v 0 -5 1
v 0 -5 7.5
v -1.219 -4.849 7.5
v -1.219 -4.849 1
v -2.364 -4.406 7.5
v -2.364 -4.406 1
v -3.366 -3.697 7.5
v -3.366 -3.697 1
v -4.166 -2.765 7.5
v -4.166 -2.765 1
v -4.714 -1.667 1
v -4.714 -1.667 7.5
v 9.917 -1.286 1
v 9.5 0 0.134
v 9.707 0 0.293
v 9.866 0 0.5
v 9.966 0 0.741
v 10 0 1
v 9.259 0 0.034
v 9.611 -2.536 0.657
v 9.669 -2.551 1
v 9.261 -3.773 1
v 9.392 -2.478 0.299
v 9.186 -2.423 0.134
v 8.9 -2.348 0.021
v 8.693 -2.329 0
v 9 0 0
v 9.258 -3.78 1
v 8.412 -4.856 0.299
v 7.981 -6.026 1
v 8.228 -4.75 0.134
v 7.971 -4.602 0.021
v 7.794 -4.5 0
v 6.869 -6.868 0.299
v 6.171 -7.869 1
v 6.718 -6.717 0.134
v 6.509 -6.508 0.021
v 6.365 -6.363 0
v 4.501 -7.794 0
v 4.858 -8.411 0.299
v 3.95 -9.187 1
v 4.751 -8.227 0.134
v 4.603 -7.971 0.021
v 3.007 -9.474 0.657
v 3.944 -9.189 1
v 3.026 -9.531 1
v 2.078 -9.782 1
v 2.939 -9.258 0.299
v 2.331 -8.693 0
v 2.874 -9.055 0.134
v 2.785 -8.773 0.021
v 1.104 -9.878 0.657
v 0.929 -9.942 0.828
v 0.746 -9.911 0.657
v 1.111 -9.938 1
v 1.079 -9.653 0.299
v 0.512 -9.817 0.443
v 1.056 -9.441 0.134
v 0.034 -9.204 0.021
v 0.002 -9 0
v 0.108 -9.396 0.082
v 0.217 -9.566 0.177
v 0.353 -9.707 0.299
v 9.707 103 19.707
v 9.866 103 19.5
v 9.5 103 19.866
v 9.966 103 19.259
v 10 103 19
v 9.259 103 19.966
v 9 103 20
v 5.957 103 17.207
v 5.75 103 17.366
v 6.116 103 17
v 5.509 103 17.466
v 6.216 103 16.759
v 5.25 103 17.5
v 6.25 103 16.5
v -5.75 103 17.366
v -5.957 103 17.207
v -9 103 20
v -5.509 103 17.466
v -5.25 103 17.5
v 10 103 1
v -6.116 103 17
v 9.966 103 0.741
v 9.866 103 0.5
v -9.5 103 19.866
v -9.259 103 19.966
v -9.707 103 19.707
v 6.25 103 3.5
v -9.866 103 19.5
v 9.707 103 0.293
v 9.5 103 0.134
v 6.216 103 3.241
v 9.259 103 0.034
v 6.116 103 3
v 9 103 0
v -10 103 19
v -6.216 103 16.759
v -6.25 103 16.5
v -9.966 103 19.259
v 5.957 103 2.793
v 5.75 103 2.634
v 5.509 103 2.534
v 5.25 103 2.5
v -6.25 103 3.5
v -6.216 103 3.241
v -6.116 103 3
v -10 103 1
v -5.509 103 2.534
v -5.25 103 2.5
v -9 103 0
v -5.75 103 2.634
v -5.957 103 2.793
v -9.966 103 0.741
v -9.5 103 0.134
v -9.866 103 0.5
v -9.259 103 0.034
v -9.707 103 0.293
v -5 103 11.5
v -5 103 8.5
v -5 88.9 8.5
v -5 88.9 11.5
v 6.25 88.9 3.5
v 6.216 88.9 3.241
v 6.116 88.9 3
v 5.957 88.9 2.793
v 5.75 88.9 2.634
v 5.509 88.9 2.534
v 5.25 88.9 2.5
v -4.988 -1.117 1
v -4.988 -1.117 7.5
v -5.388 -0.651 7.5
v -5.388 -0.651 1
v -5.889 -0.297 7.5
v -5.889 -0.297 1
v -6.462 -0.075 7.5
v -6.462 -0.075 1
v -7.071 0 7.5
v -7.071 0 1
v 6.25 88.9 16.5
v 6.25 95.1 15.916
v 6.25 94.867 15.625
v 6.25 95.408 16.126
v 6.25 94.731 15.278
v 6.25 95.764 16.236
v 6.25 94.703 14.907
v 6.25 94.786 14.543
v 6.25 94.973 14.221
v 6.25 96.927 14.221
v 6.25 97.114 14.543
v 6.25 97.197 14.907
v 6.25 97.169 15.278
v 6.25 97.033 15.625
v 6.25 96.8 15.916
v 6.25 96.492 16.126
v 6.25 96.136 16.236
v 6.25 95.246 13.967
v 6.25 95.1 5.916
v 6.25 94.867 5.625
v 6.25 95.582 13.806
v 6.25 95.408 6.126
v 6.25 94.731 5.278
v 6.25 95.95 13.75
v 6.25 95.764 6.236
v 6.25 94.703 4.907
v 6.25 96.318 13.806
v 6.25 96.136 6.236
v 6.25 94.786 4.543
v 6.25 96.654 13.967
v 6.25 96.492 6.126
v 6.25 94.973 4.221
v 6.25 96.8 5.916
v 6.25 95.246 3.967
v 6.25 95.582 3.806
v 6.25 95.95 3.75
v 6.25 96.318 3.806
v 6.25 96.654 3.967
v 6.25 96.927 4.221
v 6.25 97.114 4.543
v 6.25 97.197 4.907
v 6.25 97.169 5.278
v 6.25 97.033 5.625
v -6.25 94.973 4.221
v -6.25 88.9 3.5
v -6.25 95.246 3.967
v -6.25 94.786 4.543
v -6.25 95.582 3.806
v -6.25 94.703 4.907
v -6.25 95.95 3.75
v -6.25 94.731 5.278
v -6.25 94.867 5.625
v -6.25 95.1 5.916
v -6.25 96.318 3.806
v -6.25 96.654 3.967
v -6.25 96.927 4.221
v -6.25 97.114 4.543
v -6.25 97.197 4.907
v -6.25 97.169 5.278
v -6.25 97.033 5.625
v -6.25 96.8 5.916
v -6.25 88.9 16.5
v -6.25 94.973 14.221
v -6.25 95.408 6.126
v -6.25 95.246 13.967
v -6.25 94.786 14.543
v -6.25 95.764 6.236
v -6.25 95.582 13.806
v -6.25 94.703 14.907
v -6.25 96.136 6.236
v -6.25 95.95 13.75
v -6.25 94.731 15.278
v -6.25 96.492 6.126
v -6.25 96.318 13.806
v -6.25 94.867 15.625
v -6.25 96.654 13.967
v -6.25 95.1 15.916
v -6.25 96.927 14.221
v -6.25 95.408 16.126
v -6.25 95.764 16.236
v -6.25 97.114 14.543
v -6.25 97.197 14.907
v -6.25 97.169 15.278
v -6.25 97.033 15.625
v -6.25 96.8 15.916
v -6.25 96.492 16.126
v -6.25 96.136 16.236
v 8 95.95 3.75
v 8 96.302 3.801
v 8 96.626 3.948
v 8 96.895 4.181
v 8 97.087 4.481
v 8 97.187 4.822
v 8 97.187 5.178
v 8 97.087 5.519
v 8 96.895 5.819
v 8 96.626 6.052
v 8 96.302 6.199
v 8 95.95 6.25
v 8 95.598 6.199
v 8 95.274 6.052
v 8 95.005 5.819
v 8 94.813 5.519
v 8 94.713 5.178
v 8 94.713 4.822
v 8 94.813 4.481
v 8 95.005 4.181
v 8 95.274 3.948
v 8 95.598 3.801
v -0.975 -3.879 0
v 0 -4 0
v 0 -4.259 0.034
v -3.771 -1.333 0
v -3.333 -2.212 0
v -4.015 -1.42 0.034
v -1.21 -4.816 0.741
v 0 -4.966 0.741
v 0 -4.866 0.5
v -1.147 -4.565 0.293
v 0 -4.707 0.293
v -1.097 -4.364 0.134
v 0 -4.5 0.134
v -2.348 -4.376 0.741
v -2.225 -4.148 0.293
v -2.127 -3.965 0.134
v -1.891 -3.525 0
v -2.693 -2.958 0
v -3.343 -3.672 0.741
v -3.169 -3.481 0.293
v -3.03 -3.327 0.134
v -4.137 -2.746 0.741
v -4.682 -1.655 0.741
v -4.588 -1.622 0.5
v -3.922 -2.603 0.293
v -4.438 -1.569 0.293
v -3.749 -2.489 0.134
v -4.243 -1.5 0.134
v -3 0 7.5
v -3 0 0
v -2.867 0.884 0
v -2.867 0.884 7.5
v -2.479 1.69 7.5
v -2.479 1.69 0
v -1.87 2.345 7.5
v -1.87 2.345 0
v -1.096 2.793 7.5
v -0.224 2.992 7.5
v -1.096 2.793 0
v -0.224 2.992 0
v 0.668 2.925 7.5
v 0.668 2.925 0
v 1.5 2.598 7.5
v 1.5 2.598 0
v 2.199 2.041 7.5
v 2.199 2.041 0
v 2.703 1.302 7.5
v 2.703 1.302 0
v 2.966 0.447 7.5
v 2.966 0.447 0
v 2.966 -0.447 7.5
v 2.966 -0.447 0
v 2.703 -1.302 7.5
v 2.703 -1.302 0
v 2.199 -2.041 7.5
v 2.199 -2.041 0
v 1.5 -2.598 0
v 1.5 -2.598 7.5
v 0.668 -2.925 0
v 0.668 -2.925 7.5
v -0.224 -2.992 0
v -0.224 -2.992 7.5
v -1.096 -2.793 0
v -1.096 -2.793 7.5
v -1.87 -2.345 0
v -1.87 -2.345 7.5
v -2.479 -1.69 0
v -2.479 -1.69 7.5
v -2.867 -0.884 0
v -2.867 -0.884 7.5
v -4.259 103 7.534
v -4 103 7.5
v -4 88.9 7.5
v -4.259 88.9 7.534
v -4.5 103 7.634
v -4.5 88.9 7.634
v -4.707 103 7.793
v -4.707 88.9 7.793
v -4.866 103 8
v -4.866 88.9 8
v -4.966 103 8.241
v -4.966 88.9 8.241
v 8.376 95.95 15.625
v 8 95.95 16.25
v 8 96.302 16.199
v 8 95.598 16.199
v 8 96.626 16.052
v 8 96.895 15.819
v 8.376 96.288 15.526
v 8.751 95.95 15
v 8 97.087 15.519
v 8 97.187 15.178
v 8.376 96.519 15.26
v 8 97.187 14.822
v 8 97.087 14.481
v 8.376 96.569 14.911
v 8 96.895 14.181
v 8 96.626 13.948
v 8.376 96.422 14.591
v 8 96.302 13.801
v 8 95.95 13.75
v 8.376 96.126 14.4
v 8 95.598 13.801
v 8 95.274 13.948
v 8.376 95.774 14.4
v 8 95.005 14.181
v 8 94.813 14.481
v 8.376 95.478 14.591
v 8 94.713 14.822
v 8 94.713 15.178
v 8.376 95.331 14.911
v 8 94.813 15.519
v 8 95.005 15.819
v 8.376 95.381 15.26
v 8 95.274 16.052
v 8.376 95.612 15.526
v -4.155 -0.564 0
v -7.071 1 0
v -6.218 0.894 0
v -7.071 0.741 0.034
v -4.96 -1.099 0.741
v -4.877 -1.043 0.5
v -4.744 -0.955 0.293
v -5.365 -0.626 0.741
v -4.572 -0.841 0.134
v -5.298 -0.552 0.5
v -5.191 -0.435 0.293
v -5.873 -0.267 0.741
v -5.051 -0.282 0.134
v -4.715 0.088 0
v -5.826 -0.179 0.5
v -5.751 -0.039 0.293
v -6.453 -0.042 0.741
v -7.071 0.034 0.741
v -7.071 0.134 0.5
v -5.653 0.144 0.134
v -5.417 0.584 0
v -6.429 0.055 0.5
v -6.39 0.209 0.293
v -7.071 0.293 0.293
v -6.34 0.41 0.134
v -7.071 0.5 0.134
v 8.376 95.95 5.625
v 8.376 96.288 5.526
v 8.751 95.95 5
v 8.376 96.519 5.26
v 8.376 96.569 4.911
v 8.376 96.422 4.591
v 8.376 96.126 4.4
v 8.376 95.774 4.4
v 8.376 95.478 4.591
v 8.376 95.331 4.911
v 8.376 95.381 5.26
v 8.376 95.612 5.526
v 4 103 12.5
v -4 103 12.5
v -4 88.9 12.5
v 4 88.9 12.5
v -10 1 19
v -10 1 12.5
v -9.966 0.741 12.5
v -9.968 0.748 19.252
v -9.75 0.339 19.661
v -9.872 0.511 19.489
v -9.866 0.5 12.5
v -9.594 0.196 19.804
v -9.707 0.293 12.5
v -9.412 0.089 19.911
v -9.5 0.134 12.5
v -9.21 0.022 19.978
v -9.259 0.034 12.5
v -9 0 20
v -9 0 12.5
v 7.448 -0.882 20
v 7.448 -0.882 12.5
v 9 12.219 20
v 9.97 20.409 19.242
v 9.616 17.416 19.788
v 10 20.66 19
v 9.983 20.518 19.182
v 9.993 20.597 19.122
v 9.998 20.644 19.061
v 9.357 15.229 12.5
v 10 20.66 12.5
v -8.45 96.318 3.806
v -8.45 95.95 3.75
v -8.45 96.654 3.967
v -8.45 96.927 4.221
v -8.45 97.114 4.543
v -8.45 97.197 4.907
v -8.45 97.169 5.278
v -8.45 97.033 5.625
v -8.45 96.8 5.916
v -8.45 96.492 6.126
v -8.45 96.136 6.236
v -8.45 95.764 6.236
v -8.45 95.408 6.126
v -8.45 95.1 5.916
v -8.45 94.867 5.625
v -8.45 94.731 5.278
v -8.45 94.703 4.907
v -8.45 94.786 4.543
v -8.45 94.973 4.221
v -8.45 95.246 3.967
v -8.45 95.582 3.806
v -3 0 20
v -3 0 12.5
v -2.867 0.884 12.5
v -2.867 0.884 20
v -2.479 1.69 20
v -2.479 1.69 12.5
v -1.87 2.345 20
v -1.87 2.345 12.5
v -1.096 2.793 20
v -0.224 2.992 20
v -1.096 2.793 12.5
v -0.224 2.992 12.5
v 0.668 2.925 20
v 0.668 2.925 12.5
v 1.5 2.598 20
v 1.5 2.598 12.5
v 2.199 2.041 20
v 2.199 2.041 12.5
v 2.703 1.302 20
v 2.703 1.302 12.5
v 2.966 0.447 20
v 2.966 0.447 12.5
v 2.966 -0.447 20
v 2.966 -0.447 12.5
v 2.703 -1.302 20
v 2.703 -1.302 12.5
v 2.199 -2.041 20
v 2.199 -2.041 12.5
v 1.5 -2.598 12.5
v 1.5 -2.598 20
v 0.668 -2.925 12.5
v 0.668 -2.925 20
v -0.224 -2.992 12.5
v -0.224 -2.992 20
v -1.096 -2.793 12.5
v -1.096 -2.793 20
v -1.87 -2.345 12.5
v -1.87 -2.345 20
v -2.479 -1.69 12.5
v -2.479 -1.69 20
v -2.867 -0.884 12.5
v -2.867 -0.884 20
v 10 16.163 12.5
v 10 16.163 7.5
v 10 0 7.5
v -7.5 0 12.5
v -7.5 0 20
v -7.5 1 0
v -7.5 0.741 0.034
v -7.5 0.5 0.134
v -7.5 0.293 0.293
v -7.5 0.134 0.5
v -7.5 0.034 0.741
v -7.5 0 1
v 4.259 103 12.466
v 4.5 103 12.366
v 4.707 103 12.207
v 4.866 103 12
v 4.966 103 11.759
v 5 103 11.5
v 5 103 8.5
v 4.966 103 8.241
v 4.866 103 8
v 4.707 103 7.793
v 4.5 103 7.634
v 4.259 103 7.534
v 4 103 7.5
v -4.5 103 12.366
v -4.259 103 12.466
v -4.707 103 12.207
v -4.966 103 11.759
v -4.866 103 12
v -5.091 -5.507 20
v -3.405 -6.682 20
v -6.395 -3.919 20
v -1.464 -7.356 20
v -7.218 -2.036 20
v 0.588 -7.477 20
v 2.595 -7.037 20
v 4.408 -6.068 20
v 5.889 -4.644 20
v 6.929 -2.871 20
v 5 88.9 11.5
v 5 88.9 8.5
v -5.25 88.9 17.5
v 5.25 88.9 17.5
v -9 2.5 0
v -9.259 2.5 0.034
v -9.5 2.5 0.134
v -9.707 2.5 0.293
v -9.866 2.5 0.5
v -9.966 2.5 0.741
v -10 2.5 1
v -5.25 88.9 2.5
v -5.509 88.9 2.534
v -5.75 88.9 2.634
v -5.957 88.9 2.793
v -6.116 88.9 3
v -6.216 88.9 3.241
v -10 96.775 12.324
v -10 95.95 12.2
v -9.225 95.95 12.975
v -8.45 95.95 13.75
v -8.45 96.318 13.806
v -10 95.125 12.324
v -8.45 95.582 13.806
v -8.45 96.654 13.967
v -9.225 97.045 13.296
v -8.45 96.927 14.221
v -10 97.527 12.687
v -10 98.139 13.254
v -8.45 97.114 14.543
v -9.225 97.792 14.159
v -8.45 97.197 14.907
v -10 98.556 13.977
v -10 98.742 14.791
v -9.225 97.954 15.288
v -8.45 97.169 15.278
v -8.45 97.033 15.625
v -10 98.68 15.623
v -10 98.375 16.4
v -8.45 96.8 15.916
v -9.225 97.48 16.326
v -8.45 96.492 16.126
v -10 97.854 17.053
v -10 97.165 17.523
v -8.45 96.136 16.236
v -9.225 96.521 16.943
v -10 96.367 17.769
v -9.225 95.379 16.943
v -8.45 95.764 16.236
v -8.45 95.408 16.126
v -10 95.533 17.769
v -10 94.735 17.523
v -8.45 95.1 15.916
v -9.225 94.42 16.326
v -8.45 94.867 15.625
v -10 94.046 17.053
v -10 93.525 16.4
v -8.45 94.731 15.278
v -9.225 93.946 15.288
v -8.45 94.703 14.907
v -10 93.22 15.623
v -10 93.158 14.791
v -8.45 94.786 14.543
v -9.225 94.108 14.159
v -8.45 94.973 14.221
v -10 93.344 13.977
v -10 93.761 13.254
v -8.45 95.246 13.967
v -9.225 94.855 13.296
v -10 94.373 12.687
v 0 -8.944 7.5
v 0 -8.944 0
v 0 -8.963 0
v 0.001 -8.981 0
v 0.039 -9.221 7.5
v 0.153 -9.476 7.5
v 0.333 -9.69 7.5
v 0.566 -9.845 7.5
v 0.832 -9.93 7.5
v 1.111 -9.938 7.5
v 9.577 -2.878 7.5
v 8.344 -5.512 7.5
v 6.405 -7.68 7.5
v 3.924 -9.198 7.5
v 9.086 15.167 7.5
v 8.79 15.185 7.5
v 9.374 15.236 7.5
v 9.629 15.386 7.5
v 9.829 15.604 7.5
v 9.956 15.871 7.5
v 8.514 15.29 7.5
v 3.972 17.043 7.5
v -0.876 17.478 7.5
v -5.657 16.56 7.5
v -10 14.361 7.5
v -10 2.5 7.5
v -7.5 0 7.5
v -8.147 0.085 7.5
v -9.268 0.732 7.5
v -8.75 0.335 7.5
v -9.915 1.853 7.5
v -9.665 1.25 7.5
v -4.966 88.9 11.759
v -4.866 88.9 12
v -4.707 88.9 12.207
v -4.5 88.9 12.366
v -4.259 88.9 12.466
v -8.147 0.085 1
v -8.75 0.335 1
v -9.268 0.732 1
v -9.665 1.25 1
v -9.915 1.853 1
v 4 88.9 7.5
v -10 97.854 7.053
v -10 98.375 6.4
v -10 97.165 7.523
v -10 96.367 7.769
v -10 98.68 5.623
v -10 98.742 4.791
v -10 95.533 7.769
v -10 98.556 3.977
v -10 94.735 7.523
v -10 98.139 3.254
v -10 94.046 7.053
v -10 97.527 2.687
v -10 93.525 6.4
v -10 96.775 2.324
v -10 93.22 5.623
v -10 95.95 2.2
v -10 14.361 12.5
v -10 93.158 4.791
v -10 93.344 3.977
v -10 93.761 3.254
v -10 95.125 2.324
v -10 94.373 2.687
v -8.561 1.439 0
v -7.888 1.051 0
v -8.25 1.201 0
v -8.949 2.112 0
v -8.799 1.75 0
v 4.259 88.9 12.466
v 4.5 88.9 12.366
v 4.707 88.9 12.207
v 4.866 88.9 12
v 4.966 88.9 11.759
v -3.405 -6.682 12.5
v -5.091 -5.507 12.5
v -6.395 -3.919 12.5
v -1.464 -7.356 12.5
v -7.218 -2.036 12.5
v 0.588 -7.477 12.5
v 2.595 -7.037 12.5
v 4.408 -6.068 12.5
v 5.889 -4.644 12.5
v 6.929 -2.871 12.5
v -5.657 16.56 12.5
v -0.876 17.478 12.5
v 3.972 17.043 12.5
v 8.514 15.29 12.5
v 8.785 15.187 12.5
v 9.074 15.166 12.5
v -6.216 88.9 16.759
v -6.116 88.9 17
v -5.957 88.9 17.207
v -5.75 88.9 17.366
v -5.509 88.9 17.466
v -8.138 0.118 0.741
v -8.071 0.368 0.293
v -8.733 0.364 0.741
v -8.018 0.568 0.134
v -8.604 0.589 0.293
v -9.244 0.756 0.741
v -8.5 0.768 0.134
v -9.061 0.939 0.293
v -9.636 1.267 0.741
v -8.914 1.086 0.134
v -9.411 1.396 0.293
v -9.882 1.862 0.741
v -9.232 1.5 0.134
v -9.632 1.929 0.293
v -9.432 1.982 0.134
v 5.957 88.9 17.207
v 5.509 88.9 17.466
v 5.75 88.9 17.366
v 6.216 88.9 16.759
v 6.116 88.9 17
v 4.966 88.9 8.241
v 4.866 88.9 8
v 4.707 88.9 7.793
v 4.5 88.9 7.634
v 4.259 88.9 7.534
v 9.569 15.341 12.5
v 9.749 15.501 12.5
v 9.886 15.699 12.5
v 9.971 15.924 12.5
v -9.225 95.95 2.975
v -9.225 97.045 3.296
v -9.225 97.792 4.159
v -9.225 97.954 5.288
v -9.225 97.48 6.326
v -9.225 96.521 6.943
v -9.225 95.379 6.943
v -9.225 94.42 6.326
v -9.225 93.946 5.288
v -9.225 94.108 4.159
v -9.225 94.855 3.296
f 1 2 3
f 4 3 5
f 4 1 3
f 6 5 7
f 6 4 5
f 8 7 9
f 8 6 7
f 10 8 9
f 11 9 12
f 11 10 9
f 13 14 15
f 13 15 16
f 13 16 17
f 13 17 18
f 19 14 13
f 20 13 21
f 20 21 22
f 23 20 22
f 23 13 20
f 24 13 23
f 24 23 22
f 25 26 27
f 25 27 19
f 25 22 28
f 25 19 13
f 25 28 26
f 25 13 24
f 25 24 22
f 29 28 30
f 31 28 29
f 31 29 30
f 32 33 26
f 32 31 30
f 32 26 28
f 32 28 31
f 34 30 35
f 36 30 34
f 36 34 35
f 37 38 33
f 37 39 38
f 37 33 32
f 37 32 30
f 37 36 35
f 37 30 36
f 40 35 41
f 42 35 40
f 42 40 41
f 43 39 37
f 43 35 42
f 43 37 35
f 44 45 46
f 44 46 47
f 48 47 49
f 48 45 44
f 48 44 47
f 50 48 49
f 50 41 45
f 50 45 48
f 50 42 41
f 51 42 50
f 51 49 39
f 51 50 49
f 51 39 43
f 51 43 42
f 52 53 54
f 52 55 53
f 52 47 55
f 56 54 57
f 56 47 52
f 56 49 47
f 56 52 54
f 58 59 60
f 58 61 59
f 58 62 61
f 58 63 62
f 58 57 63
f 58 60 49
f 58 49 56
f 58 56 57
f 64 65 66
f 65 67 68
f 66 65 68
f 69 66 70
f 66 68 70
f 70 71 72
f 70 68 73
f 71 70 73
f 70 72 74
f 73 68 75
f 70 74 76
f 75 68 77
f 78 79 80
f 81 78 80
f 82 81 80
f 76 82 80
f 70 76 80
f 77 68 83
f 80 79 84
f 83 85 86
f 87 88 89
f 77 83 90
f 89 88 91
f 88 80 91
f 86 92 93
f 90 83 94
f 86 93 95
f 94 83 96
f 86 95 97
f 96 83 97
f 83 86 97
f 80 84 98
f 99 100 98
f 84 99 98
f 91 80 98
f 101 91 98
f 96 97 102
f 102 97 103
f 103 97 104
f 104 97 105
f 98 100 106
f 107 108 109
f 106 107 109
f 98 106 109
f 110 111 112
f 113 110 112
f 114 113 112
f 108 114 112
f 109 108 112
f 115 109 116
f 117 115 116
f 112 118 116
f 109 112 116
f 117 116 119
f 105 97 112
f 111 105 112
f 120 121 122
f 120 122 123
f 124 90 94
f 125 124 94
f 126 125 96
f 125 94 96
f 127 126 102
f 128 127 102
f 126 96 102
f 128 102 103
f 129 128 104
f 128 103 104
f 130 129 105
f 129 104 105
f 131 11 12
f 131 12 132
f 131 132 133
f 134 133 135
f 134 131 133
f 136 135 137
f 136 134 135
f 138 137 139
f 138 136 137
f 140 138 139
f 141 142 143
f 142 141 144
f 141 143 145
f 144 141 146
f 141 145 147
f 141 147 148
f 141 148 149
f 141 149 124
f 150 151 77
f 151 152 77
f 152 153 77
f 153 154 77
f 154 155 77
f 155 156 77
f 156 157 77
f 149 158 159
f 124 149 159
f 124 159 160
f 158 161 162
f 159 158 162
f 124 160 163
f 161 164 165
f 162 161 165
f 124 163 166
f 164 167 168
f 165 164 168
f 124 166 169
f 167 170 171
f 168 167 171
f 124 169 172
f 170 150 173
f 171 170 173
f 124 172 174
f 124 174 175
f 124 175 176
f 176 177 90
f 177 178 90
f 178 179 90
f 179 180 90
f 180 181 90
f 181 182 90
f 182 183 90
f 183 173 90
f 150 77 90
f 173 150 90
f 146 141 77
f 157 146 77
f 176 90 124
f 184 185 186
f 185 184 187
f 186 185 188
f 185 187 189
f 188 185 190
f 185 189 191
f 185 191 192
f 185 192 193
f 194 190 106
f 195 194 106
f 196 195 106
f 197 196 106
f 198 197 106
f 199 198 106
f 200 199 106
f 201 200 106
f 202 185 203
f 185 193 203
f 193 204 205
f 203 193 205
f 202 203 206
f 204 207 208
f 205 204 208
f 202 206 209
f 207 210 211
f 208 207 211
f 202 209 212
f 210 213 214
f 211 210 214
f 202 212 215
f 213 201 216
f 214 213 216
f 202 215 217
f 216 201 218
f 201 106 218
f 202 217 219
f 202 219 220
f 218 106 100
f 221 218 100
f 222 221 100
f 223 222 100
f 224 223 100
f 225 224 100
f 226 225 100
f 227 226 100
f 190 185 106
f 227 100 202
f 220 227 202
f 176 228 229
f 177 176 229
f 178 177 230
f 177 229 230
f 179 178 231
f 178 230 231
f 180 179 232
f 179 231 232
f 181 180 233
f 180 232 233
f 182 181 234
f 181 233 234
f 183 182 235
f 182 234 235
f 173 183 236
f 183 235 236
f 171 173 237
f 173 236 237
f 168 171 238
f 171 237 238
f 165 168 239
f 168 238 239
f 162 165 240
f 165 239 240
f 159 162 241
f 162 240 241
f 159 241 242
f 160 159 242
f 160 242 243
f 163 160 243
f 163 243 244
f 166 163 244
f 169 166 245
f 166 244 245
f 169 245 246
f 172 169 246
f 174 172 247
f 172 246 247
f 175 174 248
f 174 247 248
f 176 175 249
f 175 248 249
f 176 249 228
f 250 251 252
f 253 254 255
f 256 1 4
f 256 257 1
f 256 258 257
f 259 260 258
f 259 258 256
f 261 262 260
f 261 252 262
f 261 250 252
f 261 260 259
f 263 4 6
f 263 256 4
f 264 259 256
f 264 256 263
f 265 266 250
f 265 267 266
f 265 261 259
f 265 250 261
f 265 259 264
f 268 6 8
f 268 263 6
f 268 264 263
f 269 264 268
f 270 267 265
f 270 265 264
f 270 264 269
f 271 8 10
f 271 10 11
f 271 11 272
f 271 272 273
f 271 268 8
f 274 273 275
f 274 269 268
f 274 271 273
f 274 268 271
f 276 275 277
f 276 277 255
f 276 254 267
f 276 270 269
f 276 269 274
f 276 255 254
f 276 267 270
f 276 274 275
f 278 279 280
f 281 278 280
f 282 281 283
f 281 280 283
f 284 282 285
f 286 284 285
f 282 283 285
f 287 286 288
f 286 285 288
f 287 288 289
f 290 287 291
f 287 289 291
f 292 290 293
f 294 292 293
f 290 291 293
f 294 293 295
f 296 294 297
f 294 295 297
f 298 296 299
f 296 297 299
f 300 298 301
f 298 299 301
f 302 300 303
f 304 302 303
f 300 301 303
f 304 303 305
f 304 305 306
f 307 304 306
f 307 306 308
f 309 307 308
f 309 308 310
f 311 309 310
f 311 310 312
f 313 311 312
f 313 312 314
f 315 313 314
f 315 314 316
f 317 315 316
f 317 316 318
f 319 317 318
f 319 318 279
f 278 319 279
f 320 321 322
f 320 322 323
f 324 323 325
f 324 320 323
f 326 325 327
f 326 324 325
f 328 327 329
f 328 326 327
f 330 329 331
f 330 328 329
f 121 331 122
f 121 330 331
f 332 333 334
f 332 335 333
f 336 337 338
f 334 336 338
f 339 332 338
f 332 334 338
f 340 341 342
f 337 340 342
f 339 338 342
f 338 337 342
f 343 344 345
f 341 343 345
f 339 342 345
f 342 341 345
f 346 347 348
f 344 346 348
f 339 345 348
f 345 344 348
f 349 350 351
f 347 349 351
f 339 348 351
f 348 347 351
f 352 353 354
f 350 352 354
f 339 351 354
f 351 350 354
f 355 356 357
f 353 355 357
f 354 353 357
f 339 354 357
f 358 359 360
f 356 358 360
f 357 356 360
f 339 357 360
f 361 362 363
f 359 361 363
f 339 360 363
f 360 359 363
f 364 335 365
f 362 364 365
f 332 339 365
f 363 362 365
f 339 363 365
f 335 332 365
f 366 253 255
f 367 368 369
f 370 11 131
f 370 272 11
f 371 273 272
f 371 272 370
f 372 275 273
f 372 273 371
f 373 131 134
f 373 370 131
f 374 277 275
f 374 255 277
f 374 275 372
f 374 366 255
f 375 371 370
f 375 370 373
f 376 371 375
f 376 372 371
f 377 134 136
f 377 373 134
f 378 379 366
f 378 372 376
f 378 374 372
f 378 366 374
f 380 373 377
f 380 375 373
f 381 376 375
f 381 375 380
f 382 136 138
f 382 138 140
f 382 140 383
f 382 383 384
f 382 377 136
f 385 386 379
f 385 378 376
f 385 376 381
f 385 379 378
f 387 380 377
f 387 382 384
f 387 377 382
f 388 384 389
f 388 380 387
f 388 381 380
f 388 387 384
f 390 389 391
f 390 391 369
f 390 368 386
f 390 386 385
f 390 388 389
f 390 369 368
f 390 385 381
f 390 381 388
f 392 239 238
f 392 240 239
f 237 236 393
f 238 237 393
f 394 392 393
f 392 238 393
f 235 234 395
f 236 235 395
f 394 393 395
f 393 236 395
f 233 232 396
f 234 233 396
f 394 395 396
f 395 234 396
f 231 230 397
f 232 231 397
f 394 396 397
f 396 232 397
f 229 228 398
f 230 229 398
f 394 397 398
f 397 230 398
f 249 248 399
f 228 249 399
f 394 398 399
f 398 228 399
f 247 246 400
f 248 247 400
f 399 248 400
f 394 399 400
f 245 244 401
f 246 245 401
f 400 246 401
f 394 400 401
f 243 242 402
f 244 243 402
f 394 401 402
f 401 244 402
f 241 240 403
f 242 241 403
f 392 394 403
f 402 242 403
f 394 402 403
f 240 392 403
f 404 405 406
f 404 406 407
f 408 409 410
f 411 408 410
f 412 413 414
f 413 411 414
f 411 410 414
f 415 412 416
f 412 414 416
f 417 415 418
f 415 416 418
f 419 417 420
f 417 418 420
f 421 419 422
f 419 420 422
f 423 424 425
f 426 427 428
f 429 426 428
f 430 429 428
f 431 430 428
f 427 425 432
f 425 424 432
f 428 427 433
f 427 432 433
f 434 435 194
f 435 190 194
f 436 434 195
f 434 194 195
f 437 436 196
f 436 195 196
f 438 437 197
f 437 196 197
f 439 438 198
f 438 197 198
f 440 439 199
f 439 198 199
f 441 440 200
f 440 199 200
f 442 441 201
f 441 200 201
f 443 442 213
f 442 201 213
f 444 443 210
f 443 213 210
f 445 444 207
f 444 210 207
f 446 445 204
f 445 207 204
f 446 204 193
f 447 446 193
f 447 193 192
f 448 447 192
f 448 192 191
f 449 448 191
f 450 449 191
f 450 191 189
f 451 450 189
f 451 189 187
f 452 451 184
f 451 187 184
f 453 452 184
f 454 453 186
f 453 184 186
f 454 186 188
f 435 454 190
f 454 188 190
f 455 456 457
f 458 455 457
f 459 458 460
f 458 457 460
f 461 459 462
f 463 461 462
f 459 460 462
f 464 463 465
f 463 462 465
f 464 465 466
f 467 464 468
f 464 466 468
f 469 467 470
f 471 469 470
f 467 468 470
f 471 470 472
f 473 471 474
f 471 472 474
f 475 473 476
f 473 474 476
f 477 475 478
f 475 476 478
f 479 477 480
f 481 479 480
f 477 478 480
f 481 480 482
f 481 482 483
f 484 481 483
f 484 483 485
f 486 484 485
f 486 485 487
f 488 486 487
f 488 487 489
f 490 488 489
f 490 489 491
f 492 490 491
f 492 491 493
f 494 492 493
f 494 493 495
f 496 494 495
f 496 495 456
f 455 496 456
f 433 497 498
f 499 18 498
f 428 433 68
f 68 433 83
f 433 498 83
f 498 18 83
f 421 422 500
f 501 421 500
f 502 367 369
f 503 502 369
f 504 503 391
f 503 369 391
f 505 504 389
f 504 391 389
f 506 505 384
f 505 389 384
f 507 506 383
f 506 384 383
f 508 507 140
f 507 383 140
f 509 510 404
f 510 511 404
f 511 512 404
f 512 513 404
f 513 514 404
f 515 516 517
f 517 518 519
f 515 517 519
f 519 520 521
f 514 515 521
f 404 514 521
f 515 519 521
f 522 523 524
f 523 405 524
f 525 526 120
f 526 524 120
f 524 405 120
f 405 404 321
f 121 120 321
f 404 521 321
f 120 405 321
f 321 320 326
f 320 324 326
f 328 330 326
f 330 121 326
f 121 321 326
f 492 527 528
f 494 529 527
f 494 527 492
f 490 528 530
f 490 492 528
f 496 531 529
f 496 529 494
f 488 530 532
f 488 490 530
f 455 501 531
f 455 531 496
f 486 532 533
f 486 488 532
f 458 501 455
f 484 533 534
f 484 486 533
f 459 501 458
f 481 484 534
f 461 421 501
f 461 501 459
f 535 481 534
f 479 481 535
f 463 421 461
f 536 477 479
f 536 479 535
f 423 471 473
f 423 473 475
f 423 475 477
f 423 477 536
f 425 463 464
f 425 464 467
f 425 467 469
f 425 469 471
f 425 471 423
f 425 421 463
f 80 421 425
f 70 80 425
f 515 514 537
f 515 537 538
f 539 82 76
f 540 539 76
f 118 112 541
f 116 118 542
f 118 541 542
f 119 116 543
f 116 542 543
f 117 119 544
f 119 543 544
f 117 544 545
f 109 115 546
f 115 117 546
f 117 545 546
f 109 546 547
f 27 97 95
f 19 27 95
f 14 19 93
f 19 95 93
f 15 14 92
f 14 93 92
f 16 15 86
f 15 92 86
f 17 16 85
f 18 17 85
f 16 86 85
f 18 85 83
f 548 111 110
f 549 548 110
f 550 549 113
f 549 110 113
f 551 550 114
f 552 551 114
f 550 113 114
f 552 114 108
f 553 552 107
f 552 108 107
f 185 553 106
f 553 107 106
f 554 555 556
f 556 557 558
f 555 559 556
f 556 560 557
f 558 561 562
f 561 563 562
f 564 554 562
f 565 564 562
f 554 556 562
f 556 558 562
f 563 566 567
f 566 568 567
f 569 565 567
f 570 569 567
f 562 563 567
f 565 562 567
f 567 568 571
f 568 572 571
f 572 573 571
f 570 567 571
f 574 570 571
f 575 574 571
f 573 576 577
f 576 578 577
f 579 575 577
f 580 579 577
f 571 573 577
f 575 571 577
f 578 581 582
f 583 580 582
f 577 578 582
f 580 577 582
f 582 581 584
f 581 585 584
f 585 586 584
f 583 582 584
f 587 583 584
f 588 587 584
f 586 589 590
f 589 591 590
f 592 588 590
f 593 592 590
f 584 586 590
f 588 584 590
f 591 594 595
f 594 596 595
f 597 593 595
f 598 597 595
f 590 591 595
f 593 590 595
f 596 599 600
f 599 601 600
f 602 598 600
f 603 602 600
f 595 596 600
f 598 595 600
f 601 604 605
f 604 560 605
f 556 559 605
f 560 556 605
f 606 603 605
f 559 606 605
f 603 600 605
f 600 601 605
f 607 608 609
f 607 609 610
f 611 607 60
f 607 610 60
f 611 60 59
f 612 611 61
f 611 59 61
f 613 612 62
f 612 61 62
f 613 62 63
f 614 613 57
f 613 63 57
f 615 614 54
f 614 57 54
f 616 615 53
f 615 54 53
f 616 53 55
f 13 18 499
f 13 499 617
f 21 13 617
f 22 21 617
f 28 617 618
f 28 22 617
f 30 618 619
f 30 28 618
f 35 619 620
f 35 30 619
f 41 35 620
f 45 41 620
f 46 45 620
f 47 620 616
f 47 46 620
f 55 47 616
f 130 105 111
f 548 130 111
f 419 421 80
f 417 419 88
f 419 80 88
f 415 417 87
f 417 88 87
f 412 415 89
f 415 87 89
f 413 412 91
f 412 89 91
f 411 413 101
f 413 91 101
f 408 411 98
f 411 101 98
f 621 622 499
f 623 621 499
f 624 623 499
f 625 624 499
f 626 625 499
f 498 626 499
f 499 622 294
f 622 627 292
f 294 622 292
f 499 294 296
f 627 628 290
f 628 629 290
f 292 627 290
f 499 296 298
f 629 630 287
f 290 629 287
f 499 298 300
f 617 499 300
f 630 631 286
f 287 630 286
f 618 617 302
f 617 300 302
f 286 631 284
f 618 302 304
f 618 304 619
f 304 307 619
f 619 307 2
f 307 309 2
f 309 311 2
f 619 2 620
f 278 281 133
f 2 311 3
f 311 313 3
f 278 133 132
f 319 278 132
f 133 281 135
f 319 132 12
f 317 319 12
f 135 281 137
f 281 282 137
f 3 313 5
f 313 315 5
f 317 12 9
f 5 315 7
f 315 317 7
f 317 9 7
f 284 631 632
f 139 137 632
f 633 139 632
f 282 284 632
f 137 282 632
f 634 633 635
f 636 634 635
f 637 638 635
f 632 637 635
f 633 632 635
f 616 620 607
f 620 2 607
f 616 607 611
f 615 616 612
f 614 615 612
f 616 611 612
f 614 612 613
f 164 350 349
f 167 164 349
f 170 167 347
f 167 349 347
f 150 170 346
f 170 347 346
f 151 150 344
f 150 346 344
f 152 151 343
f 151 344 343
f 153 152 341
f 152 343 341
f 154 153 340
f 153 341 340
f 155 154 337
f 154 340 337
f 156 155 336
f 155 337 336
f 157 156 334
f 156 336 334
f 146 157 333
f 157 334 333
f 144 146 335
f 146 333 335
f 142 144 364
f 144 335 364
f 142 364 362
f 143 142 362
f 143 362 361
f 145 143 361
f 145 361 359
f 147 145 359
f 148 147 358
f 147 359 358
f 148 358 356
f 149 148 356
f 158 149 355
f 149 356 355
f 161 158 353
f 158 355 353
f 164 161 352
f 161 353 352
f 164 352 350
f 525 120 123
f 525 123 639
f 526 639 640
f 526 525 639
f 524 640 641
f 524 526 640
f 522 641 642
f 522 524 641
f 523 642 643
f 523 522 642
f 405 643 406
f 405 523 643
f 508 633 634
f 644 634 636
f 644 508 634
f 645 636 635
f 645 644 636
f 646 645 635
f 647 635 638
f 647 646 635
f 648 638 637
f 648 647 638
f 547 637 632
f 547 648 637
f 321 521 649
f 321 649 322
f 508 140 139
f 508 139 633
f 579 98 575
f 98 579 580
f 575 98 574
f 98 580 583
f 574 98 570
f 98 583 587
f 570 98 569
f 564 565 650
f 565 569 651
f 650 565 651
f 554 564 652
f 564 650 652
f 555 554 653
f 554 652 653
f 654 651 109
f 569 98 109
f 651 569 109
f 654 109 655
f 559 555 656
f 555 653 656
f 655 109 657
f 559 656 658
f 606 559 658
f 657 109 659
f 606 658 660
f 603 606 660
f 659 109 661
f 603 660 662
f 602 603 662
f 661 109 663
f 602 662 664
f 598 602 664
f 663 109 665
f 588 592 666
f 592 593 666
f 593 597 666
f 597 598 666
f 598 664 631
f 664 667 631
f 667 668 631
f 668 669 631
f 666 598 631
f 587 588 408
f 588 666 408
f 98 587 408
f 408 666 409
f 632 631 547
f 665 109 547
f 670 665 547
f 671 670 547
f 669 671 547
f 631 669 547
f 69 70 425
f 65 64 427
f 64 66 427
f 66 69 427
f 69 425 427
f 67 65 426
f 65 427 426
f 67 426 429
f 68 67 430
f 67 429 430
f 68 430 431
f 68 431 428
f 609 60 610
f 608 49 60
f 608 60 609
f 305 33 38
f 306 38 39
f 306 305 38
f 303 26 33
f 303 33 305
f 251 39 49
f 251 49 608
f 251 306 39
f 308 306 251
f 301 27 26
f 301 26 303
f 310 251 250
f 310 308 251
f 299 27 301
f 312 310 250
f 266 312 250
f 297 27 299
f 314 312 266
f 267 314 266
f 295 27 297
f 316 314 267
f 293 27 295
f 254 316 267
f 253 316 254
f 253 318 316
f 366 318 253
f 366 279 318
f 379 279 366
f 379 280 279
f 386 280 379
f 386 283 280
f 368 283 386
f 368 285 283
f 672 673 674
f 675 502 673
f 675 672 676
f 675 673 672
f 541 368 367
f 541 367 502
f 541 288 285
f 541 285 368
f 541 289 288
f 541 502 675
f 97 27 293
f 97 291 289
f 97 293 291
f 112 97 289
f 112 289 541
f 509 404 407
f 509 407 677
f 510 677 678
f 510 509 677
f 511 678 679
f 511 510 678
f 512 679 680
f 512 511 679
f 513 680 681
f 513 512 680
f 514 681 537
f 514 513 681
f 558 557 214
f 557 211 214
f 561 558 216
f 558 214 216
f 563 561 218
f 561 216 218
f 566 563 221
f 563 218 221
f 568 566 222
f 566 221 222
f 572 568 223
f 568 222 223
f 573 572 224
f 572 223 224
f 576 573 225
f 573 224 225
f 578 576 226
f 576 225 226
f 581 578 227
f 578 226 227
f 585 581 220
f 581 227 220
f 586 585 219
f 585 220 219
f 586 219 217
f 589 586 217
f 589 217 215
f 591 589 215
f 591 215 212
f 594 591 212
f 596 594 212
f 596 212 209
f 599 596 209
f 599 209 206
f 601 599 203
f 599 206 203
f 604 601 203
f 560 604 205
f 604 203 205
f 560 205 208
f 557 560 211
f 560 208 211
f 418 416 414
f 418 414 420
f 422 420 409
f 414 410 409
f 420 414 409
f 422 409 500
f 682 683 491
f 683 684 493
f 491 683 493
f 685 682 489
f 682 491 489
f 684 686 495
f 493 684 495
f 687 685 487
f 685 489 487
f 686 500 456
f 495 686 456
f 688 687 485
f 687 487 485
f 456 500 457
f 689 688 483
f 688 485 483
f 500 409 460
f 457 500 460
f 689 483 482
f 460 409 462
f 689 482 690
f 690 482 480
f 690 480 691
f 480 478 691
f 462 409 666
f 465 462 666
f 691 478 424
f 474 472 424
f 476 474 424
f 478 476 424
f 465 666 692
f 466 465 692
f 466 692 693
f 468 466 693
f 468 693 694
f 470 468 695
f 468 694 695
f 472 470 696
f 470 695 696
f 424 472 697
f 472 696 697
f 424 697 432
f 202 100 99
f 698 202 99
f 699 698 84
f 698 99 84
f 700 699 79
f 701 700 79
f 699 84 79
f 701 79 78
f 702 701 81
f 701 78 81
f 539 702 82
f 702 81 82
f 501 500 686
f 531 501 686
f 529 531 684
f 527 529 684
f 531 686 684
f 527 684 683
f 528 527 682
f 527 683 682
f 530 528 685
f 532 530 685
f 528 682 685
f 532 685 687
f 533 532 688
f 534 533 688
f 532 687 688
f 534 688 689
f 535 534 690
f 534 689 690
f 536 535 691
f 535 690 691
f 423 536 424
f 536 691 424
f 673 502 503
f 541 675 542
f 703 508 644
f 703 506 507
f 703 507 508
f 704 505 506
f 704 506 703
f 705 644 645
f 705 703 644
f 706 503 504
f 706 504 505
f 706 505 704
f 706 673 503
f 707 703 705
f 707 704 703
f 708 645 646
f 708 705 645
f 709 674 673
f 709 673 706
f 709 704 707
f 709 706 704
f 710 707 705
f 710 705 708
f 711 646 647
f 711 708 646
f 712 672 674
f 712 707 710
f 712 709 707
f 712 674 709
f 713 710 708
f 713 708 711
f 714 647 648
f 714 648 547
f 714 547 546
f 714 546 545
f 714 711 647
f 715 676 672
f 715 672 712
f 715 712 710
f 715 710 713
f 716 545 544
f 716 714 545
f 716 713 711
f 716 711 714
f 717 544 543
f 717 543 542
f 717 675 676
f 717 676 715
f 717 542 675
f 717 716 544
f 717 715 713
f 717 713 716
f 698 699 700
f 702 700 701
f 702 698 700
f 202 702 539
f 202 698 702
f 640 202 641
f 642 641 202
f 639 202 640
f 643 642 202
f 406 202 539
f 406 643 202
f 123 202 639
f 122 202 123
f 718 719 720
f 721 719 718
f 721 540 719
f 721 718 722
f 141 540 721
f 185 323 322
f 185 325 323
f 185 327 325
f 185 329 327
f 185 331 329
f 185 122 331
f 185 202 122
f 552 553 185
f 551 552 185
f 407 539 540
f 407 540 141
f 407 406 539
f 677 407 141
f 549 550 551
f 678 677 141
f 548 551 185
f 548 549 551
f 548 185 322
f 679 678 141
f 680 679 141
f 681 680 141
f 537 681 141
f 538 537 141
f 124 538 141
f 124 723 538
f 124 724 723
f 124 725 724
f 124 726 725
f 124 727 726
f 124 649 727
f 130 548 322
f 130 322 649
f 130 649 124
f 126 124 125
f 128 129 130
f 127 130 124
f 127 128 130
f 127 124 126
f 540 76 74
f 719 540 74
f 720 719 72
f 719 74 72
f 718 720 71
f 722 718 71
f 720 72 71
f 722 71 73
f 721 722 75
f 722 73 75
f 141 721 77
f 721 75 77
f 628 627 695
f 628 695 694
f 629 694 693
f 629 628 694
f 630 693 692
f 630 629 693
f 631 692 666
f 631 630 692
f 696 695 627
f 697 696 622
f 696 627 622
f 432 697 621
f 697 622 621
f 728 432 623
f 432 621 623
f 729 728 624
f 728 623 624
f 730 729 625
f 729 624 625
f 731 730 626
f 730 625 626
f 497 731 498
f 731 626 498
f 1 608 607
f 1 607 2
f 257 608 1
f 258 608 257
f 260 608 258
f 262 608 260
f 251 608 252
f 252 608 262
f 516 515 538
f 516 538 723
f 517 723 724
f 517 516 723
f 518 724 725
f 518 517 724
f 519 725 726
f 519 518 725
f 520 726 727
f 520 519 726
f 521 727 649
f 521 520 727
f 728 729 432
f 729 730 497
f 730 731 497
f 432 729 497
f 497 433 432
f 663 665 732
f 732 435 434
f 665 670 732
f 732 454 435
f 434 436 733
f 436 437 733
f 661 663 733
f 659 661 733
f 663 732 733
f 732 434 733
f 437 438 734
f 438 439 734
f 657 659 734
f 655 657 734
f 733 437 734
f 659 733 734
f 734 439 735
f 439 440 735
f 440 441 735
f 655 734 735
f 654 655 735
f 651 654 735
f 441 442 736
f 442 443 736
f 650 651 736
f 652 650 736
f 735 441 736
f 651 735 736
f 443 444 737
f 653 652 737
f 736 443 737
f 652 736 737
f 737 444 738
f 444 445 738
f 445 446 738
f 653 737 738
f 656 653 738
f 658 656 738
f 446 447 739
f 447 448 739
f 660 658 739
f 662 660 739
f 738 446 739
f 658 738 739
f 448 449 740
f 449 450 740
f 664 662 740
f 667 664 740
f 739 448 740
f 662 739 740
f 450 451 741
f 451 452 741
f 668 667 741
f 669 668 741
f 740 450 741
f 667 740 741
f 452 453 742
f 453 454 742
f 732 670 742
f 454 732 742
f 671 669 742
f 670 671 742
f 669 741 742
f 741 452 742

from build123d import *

# Parameters (mm, degrees)
BOSS_EXTRUDE1_DEPTH             = 7.5
BOSS_EXTRUDE2_DEPTH             = 5
BOSS_EXTRUDE3_DEPTH             = 7.5
SKETCH4_R                       = 3
CUT_EXTRUDE1_DEPTH              = 106.399240984
CUT_EXTRUDE2_DEPTH              = 14.1
FILLET1_R                       = 1
M3X0_5_TAPPED_HOLE1_D           = 2.5
M3X0_5_TAPPED_HOLE1_DEPTH       = 18
M3X0_5_TAPPED_HOLE1_CSINK_D     = 5.6
M3X0_5_TAPPED_HOLE1_CSINK_ANGLE = 90
M3X0_5_TAPPED_HOLE1_TIP         = 0.751075774


with BuildPart() as part:
    # Sketch1 → Boss-Extrude1 (new body)
    with BuildSketch(Plane.XY):
        with BuildLine():
            Line((0, -10), (0, -5))
            ThreePointArc((0, -5), (-2.886751346, -4.082482905), (-4.714045208, -1.666666667))
            ThreePointArc((-4.714045208, -1.666666667), (-5.627692139, -0.458758548), (-7.071067812, 0))
            Line((-7.071067812, 0), (-7.5, 0))
            ThreePointArc((-7.5, 0), (-9.267766953, 0.732233047), (-10, 2.5))
            Line((-10, 2.5), (-10, 103))
            Line((-10, 103), (10, 103))
            Line((10, 103), (10, 0))
            ThreePointArc((10, 0), (7.071067812, -7.071067812), (0, -10))
        make_face()
    extrude(amount=BOSS_EXTRUDE1_DEPTH)

    # Sketch2 → Boss-Extrude2 (add)
    with BuildSketch(Plane.XY.offset(7.5)):
        with BuildLine():
            Line((-10, 103), (10, 103))
            Line((10, 103), (10, 14.361406616))
            ThreePointArc((10, 14.361406616), (0, 17.5), (-10, 14.361406616))
            Line((-10, 14.361406616), (-10, 103))
        make_face()
    extrude(amount=BOSS_EXTRUDE2_DEPTH)

    # Sketch3 → Boss-Extrude3 (add)
    with BuildSketch(Plane.XY.offset(12.5)):
        with BuildLine():
            Line((7.447916037, -0.882352941), (10, 20.659715081))
            Line((10, 20.659715081), (10, 103))
            Line((10, 103), (-10, 103))
            Line((-10, 103), (-10, 0))
            Line((-10, 0), (-7.5, 0))
            ThreePointArc((-7.5, 0), (-0.441944412, -7.486967686), (7.447916037, -0.882352941))
        make_face()
    extrude(amount=BOSS_EXTRUDE3_DEPTH)

    # Sketch4 → Cut-Extrude1 (cut, through all)
    with BuildSketch(Plane(origin=(0, 0, 0), x_dir=(-1, 0, 0), z_dir=(0, 0, -1))):
        Circle(SKETCH4_R)
    extrude(amount=-CUT_EXTRUDE1_DEPTH, mode=Mode.SUBTRACT)

    # Sketch5 → Cut-Extrude2 (cut)
    with BuildSketch(Plane(origin=(0, 103, 0), x_dir=(1, 0, 0), z_dir=(0, 1, 0))):
        with BuildLine():
            Line((-5.25, -17.5), (5.25, -17.5))
            ThreePointArc((5.25, -17.5), (5.957106781, -17.207106781), (6.25, -16.5))
            Line((6.25, -16.5), (6.25, -3.5))
            ThreePointArc((6.25, -3.5), (5.957106781, -2.792893219), (5.25, -2.5))
            Line((5.25, -2.5), (-5.25, -2.5))
            ThreePointArc((-5.25, -2.5), (-5.957106781, -2.792893219), (-6.25, -3.5))
            Line((-6.25, -3.5), (-6.25, -16.5))
            ThreePointArc((-6.25, -16.5), (-5.957106781, -17.207106781), (-5.25, -17.5))
        make_face()
        with BuildLine():
            Line((-4, -12.5), (4, -12.5))
            ThreePointArc((4, -12.5), (4.707106781, -12.207106781), (5, -11.5))
            Line((5, -11.5), (5, -8.5))
            ThreePointArc((5, -8.5), (4.707106781, -7.792893219), (4, -7.5))
            Line((4, -7.5), (-4, -7.5))
            ThreePointArc((-4, -7.5), (-4.707106781, -7.792893219), (-5, -8.5))
            Line((-5, -8.5), (-5, -11.5))
            ThreePointArc((-5, -11.5), (-4.707106781, -12.207106781), (-4, -12.5))
        make_face(mode=Mode.SUBTRACT)
    extrude(amount=-CUT_EXTRUDE2_DEPTH, mode=Mode.SUBTRACT)

    # Fillet1
    # the kernel refuses this fillet: 1 mm, written as the material it takes off along each edge
    with BuildSketch(Plane(origin=(10, 105.5, 0), x_dir=(-1, 0, 0), z_dir=(0, -1, 0))) as fillet1_piece_1:
        with BuildLine():
            CenterArc((FILLET1_R, -FILLET1_R), FILLET1_R, 90, 90)
            Line((0, -FILLET1_R), (0, 0))
            Line((0, 0), (FILLET1_R, 0))
        make_face()
    extrude(amount=105.5, mode=Mode.SUBTRACT)
    with BuildSketch(Plane(origin=(0, 0, 0), x_dir=(1, 0, 0), z_dir=(0, 1, 0))) as fillet1_piece_2:
        with BuildLine():
            CenterArc((10 - FILLET1_R, -FILLET1_R), FILLET1_R, 0, 90)
            Line((10 - FILLET1_R, 0), (10, 0))
            Line((10, 0), (10, -FILLET1_R))
        make_face()
    revolve(axis=Axis((0, 0, 0), (0, 0, -1)), revolution_arc=104.329698924, mode=Mode.SUBTRACT)
    with BuildSketch(Plane(origin=(0, 0, 0), x_dir=(0, -1, 0), z_dir=(1, 0, 0))) as fillet1_piece_3:
        with BuildLine():
            CenterArc((5 - FILLET1_R, -FILLET1_R), FILLET1_R, 0, 90)
            Line((5 - FILLET1_R, 0), (5, 0))
            Line((5, 0), (5, -FILLET1_R))
        make_face()
    revolve(axis=Axis((0, 0, 0), (0, 0, -1)), revolution_arc=70.528779366, mode=Mode.SUBTRACT)
    with BuildSketch(Plane(origin=(-7.071067812, -2.5, 0), x_dir=(0.9428090415820636, 0.3333333333333328, 0), z_dir=(0.3333333333333328, -0.9428090415820636, 0))) as fillet1_piece_4:
        with BuildLine():
            CenterArc((2.5 + FILLET1_R, FILLET1_R), FILLET1_R, 180, 90)
            Line((2.5, FILLET1_R), (2.5, 0))
            Line((2.5, 0), (2.5 + FILLET1_R, 0))
        make_face()
    revolve(axis=Axis((-7.071067812, -2.5, 0), (0, 0, 1)), revolution_arc=70.528779366, mode=Mode.SUBTRACT)
    with BuildSketch(Plane(origin=(0, -10, -2.782087795), x_dir=(0, 1, 0), z_dir=(0, 0, 1))) as fillet1_piece_5:
        with BuildLine():
            CenterArc((1.05572809, -1), FILLET1_R, 90, 96.379370208)
            ThreePointArc((0.0619201, -1.111111111), (0.015492025, -0.556417559), (0, 0))
            Line((0, 0), (1.05572809, 0))
        make_face()
    extrude(amount=13.06417559, mode=Mode.SUBTRACT)
    with BuildSketch(Plane(origin=(10, 14.361406616, 7.5), x_dir=(0, 1, 0), z_dir=(0, 0, 1))) as fillet1_piece_6:
        with BuildLine():
            CenterArc((1.801823259, 1), FILLET1_R, 150.89009106, 119.10990894)
            ThreePointArc((0.928135158, 1.486486486), (0.482686338, 0.731618028), (0, 0))
            Line((0, 0), (1.801823259, 0))
        make_face()
    extrude(amount=5, mode=Mode.SUBTRACT)
    with BuildSketch(Plane(origin=(-10, 0, 10), x_dir=(0, 1, 0), z_dir=(0, 0, 1))) as fillet1_piece_7:
        with BuildLine():
            CenterArc((FILLET1_R, -FILLET1_R), FILLET1_R, 90, 90)
            Line((0, -FILLET1_R), (0, 0))
            Line((0, 0), (FILLET1_R, 0))
        make_face()
    extrude(amount=12.5, mode=Mode.SUBTRACT)
    with BuildSketch(Plane(origin=(10, 8.159715081, 20), x_dir=(0, 0, -1), z_dir=(0, 1, 0))) as fillet1_piece_8:
        with BuildLine():
            CenterArc((FILLET1_R, FILLET1_R), FILLET1_R, 180, 90)
            Line((0, FILLET1_R), (0, 0))
            Line((0, 0), (FILLET1_R, 0))
        make_face()
    extrude(amount=97.340284919, mode=Mode.SUBTRACT)
    with BuildSketch(Plane(origin=(-10, 105.5, 20), x_dir=(0, 0, -1), z_dir=(0, -1, 0))) as fillet1_piece_9:
        with BuildLine():
            CenterArc((FILLET1_R, FILLET1_R), FILLET1_R, 180, 90)
            Line((0, FILLET1_R), (0, 0))
            Line((0, 0), (FILLET1_R, 0))
        make_face()
    extrude(amount=108, mode=Mode.SUBTRACT)
    with BuildSketch(Plane(origin=(-7.071067812, 0, 0), x_dir=(0, 1, 0), z_dir=(-1, 0, 0))) as fillet1_piece_10:
        with BuildLine():
            CenterArc((FILLET1_R, -FILLET1_R), FILLET1_R, 90, 90)
            Line((0, -FILLET1_R), (0, 0))
            Line((0, 0), (FILLET1_R, 0))
        make_face()
    extrude(amount=0.428932188, mode=Mode.SUBTRACT)
    with BuildSketch(Plane(origin=(-7.5, 2.5, 0), x_dir=(0, -1, 0), z_dir=(1, 0, 0))) as fillet1_piece_11:
        with BuildLine():
            CenterArc((2.5 - FILLET1_R, -FILLET1_R), FILLET1_R, 0, 90)
            Line((2.5, -FILLET1_R), (2.5, 0))
            Line((2.5, 0), (2.5 - FILLET1_R, 0))
        make_face()
    revolve(axis=Axis((-7.5, 2.5, 0), (0, 0, -1)), revolution_arc=90, mode=Mode.SUBTRACT)
    with BuildSketch(Plane(origin=(-10, 2.5, 0), x_dir=(1, 0, 0), z_dir=(0, 1, 0))) as fillet1_piece_12:
        with BuildLine():
            CenterArc((FILLET1_R, -FILLET1_R), FILLET1_R, 90, 90)
            Line((0, -FILLET1_R), (0, 0))
            Line((0, 0), (FILLET1_R, 0))
        make_face()
    extrude(amount=103, mode=Mode.SUBTRACT)

    # M3x0.5 Tapped Hole1
    with Locations(Plane.ZY.offset(10)):
        with Locations((15, 95.95), (5, 95.95)):
            CounterSinkHole(M3X0_5_TAPPED_HOLE1_D / 2, M3X0_5_TAPPED_HOLE1_CSINK_D / 2, depth=M3X0_5_TAPPED_HOLE1_DEPTH, counter_sink_angle=M3X0_5_TAPPED_HOLE1_CSINK_ANGLE)
            with Locations((0, 0, -(M3X0_5_TAPPED_HOLE1_DEPTH + M3X0_5_TAPPED_HOLE1_TIP / 2))):  # 118° drill point
                Cone(0, M3X0_5_TAPPED_HOLE1_D / 2, M3X0_5_TAPPED_HOLE1_TIP, mode=Mode.SUBTRACT)


solid = part.part
